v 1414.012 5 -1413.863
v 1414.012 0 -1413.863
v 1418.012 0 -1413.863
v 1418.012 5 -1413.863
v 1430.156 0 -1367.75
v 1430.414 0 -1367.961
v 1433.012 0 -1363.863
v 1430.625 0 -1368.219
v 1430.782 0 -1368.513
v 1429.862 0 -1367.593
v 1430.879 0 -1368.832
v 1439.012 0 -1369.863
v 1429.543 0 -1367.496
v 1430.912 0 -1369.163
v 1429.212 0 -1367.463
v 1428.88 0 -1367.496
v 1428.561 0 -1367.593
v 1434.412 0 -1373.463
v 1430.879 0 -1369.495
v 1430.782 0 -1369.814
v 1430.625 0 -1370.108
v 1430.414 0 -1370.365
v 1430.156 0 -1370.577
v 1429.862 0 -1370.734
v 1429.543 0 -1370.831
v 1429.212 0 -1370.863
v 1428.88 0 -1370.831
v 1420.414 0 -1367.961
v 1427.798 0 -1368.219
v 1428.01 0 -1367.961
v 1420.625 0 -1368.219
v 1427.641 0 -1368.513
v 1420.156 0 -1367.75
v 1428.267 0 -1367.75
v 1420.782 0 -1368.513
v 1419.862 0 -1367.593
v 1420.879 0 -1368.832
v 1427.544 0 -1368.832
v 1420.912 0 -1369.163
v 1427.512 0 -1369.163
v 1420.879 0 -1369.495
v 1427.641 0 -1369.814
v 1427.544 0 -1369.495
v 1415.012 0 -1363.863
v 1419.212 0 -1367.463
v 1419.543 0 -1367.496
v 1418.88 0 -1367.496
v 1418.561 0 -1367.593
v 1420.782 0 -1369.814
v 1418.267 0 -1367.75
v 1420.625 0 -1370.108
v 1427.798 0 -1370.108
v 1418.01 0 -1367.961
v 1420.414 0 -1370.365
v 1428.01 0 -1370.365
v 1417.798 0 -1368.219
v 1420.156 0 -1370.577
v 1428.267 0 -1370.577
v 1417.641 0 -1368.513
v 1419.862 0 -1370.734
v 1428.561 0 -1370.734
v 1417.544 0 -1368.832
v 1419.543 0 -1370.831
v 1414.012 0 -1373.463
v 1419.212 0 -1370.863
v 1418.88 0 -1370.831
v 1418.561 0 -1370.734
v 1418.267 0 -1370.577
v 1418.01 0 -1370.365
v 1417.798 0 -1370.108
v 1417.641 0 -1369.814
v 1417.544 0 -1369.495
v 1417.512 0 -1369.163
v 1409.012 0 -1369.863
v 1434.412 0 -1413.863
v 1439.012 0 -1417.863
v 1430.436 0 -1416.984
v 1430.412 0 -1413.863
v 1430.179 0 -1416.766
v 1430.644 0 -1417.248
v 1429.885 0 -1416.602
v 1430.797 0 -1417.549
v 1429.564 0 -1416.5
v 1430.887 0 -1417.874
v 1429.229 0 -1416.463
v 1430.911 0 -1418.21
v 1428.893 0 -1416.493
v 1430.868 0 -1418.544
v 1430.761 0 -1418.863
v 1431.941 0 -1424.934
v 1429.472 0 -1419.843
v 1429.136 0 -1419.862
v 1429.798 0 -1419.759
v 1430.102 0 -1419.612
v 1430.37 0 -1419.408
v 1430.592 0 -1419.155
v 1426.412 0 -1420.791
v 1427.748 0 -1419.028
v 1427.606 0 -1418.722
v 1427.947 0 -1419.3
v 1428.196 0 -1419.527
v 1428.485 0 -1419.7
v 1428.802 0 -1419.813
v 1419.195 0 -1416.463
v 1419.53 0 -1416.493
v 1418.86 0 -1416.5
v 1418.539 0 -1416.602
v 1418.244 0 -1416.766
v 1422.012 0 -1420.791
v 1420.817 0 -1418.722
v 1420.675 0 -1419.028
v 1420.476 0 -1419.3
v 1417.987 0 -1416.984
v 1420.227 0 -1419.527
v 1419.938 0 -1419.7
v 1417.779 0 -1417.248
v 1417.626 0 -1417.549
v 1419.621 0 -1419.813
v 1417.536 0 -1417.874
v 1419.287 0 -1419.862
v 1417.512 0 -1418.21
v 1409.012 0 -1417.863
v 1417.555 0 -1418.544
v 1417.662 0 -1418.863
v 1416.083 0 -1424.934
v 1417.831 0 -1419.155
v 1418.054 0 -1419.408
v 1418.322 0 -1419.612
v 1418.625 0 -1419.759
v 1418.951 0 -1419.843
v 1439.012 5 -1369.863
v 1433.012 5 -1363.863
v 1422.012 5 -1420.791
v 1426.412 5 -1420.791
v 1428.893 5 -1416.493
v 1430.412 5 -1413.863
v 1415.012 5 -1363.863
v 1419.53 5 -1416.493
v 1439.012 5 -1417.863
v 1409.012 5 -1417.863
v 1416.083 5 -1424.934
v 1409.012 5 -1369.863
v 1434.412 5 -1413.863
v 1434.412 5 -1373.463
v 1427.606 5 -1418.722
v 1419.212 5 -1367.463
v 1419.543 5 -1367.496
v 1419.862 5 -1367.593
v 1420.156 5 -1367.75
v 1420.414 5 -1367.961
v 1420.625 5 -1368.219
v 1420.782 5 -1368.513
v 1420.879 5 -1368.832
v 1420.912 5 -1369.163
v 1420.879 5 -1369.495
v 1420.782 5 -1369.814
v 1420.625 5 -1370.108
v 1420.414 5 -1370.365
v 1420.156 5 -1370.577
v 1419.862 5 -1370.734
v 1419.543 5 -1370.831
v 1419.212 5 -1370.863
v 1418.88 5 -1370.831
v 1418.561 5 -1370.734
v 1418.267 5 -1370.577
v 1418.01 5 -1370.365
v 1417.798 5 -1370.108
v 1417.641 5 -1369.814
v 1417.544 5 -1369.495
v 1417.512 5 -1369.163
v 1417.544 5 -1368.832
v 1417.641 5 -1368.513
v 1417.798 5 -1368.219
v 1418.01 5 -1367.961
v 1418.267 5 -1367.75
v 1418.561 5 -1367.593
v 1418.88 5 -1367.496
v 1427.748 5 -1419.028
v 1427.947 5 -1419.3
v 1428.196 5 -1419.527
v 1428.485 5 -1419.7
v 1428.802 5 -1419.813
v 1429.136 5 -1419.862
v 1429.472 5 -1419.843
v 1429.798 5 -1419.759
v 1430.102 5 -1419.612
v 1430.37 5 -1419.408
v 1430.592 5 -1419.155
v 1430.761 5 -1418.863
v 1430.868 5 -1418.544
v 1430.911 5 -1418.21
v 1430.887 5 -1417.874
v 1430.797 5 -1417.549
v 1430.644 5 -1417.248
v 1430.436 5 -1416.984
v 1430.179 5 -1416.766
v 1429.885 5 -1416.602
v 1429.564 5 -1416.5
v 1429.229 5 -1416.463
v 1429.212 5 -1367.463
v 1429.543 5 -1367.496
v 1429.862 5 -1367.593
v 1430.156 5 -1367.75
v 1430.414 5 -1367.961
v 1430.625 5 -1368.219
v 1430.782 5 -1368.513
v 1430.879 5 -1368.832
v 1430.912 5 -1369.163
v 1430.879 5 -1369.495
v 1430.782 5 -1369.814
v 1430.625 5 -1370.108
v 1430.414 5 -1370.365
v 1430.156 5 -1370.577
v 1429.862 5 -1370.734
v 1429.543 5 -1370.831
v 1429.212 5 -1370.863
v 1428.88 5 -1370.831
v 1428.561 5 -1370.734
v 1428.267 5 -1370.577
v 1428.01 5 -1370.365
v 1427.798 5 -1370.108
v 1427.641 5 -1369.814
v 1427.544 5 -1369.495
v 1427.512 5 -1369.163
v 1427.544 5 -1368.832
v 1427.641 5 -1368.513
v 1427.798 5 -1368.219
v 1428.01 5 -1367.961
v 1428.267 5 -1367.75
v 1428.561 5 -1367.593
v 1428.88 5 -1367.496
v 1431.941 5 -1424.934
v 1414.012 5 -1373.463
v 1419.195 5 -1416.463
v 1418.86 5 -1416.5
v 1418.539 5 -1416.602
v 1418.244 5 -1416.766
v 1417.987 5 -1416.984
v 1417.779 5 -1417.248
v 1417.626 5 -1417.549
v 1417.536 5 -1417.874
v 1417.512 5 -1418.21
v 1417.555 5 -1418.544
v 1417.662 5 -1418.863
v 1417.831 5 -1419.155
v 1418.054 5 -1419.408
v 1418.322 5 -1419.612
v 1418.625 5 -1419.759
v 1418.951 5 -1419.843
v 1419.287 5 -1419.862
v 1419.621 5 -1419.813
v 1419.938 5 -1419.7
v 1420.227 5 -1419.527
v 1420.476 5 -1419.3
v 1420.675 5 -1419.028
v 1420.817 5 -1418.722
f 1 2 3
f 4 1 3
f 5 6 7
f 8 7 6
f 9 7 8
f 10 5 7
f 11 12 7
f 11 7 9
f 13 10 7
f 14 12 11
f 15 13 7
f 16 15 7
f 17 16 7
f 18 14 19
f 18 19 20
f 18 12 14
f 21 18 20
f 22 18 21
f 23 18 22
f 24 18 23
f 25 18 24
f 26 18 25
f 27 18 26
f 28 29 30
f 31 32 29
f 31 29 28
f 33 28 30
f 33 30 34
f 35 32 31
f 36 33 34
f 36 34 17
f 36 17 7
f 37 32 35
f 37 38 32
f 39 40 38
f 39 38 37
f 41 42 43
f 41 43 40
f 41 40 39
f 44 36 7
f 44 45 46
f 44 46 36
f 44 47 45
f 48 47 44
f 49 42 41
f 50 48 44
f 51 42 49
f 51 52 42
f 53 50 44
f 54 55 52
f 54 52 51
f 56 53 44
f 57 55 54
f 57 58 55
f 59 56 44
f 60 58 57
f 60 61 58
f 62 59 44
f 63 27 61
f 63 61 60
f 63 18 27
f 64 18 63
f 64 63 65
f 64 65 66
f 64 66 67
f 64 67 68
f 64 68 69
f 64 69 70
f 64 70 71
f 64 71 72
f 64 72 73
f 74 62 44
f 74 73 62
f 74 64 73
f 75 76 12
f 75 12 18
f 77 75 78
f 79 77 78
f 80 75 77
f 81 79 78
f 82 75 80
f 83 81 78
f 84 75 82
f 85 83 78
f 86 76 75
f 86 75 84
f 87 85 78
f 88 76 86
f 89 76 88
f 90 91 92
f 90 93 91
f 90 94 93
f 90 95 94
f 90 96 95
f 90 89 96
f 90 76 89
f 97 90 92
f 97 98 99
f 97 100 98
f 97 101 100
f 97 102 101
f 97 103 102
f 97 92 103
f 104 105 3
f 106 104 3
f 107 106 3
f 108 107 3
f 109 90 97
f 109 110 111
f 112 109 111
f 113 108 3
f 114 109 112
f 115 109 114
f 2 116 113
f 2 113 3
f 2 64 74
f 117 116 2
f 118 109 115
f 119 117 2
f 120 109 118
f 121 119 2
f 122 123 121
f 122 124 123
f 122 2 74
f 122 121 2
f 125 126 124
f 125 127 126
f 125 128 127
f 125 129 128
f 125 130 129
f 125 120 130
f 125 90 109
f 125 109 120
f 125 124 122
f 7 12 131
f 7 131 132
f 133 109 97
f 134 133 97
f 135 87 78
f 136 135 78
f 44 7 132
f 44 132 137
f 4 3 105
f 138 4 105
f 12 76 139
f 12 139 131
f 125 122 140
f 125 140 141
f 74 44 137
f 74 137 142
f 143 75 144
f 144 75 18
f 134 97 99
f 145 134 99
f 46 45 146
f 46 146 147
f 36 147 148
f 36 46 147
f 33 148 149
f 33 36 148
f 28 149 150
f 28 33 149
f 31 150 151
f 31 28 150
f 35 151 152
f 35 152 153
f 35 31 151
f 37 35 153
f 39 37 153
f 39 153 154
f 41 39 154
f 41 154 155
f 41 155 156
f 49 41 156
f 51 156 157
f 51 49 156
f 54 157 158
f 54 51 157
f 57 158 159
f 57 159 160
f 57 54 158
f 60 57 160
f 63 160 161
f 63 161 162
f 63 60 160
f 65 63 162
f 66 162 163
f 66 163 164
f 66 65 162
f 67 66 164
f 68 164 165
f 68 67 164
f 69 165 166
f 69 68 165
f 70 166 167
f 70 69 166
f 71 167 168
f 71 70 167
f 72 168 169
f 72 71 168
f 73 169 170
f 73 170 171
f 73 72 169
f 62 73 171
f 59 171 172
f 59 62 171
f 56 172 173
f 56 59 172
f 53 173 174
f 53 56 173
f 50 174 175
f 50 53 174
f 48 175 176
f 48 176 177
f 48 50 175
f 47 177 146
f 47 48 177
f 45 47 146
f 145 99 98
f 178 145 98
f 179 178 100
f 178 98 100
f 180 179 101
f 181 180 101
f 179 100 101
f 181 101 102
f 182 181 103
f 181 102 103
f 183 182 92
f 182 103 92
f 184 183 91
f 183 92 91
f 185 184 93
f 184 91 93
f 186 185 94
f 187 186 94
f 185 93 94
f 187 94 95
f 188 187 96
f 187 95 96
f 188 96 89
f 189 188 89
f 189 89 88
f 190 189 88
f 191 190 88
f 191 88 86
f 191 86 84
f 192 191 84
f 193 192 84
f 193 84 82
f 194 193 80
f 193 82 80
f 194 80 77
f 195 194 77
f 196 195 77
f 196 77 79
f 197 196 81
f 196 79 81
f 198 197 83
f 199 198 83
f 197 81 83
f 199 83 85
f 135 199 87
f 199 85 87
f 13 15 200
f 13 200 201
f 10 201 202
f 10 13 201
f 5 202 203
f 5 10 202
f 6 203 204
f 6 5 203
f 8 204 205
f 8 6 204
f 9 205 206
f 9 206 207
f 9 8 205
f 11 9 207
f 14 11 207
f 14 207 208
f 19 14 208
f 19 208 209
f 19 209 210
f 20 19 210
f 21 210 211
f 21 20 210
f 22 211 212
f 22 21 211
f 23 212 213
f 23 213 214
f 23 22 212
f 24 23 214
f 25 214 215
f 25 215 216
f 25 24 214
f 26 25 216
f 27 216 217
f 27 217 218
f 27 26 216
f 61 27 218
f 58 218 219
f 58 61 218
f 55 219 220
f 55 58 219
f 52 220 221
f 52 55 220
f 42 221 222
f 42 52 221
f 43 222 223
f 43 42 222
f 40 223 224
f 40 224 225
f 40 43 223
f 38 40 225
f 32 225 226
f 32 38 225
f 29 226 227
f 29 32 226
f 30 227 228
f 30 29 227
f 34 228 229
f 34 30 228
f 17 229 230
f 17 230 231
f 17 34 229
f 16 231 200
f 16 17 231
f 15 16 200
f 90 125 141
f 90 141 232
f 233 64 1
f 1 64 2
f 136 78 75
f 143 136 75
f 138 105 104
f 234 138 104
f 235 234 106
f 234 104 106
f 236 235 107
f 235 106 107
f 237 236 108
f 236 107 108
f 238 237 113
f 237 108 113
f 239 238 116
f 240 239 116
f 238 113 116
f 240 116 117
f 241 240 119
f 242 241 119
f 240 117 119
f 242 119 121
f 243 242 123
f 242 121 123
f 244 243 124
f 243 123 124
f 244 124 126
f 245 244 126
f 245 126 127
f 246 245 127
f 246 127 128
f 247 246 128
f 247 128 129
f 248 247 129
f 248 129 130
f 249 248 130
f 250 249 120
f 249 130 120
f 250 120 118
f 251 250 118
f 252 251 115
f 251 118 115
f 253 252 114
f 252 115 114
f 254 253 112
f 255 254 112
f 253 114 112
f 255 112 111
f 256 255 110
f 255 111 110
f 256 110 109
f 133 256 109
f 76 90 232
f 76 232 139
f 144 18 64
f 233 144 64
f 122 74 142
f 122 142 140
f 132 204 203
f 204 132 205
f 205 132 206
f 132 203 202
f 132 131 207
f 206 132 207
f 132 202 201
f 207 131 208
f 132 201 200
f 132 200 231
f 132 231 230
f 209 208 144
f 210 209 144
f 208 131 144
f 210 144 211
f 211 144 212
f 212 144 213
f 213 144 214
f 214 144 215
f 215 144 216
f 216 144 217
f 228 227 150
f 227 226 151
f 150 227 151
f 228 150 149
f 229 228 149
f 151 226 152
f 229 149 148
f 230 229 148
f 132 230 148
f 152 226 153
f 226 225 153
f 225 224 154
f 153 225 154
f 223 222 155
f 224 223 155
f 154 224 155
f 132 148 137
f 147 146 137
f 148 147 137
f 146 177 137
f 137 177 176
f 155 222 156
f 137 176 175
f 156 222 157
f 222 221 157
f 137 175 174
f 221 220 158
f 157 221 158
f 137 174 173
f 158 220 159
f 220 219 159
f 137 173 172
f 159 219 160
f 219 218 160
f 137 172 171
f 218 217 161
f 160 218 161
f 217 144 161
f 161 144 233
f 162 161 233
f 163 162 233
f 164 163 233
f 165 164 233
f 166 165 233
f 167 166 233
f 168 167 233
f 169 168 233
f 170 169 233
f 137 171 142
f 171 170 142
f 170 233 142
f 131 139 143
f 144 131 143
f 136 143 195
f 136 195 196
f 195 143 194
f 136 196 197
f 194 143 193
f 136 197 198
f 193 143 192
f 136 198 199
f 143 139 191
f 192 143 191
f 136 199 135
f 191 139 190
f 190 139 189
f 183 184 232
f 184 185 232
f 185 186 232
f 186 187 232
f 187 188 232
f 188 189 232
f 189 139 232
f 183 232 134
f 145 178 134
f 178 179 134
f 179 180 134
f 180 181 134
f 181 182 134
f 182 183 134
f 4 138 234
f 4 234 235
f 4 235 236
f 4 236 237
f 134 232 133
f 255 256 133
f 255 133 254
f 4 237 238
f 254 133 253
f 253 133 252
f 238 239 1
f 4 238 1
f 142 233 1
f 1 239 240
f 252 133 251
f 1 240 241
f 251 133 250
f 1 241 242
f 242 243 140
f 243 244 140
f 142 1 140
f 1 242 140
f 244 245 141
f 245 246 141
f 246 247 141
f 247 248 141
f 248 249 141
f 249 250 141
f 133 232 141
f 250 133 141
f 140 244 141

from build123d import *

# Parameters (mm, degrees)
SKETCH_1_R      = 1.7
EXTRUDE_1_DEPTH = 5


with BuildPart() as part:
    # 草图1 → 凸台-拉伸1 (new body)
    with BuildSketch(Plane(origin=(0, 0, 0), x_dir=(1, 0, 0), z_dir=(0, 1, 0))):
        Polygon((1439.011595349, 1417.863209963), (1439.011595349, 1369.863209963), (1433.011595349, 1363.863209963), (1415.011595349, 1363.863209963), (1409.011595349, 1369.863209963), (1409.011595349, 1417.863209963), (1416.08266316, 1424.934277775), (1431.940527537, 1424.934277775), align=None)
        with Locations(Location((1429.211595349, 1369.163209963, 0), (0, 0, 270))):
            Circle(SKETCH_1_R, mode=Mode.SUBTRACT)
        with Locations(Location((1419.211595349, 1369.163209963, 0), (0, 0, 270))):
            Circle(SKETCH_1_R, mode=Mode.SUBTRACT)
        with BuildLine():
            Line((1434.411595349, 1413.863209963), (1434.411595349, 1373.463209963))
            Line((1434.411595349, 1373.463209963), (1414.011595349, 1373.463209963))
            Line((1414.011595349, 1373.463209963), (1414.011595349, 1413.863209963))
            Line((1414.011595349, 1413.863209963), (1418.011595349, 1413.863209963))
            Line((1418.011595349, 1413.863209963), (1419.530084528, 1416.493310372))
            ThreePointArc((1419.530084528, 1416.493310372), (1417.739352162, 1419.013209963), (1420.817015405, 1418.722340038))
            Line((1420.817015405, 1418.722340038), (1422.011595349, 1420.791413193))
            Line((1422.011595349, 1420.791413193), (1426.411595349, 1420.791413193))
            Line((1426.411595349, 1420.791413193), (1427.606175292, 1418.722340038))
            ThreePointArc((1427.606175292, 1418.722340038), (1430.683838535, 1419.013209963), (1428.893106169, 1416.493310372))
            Line((1428.893106169, 1416.493310372), (1430.411595349, 1413.863209963))
            Line((1430.411595349, 1413.863209963), (1434.411595349, 1413.863209963))
        make_face(mode=Mode.SUBTRACT)
    extrude(amount=EXTRUDE_1_DEPTH)


solid = part.part
